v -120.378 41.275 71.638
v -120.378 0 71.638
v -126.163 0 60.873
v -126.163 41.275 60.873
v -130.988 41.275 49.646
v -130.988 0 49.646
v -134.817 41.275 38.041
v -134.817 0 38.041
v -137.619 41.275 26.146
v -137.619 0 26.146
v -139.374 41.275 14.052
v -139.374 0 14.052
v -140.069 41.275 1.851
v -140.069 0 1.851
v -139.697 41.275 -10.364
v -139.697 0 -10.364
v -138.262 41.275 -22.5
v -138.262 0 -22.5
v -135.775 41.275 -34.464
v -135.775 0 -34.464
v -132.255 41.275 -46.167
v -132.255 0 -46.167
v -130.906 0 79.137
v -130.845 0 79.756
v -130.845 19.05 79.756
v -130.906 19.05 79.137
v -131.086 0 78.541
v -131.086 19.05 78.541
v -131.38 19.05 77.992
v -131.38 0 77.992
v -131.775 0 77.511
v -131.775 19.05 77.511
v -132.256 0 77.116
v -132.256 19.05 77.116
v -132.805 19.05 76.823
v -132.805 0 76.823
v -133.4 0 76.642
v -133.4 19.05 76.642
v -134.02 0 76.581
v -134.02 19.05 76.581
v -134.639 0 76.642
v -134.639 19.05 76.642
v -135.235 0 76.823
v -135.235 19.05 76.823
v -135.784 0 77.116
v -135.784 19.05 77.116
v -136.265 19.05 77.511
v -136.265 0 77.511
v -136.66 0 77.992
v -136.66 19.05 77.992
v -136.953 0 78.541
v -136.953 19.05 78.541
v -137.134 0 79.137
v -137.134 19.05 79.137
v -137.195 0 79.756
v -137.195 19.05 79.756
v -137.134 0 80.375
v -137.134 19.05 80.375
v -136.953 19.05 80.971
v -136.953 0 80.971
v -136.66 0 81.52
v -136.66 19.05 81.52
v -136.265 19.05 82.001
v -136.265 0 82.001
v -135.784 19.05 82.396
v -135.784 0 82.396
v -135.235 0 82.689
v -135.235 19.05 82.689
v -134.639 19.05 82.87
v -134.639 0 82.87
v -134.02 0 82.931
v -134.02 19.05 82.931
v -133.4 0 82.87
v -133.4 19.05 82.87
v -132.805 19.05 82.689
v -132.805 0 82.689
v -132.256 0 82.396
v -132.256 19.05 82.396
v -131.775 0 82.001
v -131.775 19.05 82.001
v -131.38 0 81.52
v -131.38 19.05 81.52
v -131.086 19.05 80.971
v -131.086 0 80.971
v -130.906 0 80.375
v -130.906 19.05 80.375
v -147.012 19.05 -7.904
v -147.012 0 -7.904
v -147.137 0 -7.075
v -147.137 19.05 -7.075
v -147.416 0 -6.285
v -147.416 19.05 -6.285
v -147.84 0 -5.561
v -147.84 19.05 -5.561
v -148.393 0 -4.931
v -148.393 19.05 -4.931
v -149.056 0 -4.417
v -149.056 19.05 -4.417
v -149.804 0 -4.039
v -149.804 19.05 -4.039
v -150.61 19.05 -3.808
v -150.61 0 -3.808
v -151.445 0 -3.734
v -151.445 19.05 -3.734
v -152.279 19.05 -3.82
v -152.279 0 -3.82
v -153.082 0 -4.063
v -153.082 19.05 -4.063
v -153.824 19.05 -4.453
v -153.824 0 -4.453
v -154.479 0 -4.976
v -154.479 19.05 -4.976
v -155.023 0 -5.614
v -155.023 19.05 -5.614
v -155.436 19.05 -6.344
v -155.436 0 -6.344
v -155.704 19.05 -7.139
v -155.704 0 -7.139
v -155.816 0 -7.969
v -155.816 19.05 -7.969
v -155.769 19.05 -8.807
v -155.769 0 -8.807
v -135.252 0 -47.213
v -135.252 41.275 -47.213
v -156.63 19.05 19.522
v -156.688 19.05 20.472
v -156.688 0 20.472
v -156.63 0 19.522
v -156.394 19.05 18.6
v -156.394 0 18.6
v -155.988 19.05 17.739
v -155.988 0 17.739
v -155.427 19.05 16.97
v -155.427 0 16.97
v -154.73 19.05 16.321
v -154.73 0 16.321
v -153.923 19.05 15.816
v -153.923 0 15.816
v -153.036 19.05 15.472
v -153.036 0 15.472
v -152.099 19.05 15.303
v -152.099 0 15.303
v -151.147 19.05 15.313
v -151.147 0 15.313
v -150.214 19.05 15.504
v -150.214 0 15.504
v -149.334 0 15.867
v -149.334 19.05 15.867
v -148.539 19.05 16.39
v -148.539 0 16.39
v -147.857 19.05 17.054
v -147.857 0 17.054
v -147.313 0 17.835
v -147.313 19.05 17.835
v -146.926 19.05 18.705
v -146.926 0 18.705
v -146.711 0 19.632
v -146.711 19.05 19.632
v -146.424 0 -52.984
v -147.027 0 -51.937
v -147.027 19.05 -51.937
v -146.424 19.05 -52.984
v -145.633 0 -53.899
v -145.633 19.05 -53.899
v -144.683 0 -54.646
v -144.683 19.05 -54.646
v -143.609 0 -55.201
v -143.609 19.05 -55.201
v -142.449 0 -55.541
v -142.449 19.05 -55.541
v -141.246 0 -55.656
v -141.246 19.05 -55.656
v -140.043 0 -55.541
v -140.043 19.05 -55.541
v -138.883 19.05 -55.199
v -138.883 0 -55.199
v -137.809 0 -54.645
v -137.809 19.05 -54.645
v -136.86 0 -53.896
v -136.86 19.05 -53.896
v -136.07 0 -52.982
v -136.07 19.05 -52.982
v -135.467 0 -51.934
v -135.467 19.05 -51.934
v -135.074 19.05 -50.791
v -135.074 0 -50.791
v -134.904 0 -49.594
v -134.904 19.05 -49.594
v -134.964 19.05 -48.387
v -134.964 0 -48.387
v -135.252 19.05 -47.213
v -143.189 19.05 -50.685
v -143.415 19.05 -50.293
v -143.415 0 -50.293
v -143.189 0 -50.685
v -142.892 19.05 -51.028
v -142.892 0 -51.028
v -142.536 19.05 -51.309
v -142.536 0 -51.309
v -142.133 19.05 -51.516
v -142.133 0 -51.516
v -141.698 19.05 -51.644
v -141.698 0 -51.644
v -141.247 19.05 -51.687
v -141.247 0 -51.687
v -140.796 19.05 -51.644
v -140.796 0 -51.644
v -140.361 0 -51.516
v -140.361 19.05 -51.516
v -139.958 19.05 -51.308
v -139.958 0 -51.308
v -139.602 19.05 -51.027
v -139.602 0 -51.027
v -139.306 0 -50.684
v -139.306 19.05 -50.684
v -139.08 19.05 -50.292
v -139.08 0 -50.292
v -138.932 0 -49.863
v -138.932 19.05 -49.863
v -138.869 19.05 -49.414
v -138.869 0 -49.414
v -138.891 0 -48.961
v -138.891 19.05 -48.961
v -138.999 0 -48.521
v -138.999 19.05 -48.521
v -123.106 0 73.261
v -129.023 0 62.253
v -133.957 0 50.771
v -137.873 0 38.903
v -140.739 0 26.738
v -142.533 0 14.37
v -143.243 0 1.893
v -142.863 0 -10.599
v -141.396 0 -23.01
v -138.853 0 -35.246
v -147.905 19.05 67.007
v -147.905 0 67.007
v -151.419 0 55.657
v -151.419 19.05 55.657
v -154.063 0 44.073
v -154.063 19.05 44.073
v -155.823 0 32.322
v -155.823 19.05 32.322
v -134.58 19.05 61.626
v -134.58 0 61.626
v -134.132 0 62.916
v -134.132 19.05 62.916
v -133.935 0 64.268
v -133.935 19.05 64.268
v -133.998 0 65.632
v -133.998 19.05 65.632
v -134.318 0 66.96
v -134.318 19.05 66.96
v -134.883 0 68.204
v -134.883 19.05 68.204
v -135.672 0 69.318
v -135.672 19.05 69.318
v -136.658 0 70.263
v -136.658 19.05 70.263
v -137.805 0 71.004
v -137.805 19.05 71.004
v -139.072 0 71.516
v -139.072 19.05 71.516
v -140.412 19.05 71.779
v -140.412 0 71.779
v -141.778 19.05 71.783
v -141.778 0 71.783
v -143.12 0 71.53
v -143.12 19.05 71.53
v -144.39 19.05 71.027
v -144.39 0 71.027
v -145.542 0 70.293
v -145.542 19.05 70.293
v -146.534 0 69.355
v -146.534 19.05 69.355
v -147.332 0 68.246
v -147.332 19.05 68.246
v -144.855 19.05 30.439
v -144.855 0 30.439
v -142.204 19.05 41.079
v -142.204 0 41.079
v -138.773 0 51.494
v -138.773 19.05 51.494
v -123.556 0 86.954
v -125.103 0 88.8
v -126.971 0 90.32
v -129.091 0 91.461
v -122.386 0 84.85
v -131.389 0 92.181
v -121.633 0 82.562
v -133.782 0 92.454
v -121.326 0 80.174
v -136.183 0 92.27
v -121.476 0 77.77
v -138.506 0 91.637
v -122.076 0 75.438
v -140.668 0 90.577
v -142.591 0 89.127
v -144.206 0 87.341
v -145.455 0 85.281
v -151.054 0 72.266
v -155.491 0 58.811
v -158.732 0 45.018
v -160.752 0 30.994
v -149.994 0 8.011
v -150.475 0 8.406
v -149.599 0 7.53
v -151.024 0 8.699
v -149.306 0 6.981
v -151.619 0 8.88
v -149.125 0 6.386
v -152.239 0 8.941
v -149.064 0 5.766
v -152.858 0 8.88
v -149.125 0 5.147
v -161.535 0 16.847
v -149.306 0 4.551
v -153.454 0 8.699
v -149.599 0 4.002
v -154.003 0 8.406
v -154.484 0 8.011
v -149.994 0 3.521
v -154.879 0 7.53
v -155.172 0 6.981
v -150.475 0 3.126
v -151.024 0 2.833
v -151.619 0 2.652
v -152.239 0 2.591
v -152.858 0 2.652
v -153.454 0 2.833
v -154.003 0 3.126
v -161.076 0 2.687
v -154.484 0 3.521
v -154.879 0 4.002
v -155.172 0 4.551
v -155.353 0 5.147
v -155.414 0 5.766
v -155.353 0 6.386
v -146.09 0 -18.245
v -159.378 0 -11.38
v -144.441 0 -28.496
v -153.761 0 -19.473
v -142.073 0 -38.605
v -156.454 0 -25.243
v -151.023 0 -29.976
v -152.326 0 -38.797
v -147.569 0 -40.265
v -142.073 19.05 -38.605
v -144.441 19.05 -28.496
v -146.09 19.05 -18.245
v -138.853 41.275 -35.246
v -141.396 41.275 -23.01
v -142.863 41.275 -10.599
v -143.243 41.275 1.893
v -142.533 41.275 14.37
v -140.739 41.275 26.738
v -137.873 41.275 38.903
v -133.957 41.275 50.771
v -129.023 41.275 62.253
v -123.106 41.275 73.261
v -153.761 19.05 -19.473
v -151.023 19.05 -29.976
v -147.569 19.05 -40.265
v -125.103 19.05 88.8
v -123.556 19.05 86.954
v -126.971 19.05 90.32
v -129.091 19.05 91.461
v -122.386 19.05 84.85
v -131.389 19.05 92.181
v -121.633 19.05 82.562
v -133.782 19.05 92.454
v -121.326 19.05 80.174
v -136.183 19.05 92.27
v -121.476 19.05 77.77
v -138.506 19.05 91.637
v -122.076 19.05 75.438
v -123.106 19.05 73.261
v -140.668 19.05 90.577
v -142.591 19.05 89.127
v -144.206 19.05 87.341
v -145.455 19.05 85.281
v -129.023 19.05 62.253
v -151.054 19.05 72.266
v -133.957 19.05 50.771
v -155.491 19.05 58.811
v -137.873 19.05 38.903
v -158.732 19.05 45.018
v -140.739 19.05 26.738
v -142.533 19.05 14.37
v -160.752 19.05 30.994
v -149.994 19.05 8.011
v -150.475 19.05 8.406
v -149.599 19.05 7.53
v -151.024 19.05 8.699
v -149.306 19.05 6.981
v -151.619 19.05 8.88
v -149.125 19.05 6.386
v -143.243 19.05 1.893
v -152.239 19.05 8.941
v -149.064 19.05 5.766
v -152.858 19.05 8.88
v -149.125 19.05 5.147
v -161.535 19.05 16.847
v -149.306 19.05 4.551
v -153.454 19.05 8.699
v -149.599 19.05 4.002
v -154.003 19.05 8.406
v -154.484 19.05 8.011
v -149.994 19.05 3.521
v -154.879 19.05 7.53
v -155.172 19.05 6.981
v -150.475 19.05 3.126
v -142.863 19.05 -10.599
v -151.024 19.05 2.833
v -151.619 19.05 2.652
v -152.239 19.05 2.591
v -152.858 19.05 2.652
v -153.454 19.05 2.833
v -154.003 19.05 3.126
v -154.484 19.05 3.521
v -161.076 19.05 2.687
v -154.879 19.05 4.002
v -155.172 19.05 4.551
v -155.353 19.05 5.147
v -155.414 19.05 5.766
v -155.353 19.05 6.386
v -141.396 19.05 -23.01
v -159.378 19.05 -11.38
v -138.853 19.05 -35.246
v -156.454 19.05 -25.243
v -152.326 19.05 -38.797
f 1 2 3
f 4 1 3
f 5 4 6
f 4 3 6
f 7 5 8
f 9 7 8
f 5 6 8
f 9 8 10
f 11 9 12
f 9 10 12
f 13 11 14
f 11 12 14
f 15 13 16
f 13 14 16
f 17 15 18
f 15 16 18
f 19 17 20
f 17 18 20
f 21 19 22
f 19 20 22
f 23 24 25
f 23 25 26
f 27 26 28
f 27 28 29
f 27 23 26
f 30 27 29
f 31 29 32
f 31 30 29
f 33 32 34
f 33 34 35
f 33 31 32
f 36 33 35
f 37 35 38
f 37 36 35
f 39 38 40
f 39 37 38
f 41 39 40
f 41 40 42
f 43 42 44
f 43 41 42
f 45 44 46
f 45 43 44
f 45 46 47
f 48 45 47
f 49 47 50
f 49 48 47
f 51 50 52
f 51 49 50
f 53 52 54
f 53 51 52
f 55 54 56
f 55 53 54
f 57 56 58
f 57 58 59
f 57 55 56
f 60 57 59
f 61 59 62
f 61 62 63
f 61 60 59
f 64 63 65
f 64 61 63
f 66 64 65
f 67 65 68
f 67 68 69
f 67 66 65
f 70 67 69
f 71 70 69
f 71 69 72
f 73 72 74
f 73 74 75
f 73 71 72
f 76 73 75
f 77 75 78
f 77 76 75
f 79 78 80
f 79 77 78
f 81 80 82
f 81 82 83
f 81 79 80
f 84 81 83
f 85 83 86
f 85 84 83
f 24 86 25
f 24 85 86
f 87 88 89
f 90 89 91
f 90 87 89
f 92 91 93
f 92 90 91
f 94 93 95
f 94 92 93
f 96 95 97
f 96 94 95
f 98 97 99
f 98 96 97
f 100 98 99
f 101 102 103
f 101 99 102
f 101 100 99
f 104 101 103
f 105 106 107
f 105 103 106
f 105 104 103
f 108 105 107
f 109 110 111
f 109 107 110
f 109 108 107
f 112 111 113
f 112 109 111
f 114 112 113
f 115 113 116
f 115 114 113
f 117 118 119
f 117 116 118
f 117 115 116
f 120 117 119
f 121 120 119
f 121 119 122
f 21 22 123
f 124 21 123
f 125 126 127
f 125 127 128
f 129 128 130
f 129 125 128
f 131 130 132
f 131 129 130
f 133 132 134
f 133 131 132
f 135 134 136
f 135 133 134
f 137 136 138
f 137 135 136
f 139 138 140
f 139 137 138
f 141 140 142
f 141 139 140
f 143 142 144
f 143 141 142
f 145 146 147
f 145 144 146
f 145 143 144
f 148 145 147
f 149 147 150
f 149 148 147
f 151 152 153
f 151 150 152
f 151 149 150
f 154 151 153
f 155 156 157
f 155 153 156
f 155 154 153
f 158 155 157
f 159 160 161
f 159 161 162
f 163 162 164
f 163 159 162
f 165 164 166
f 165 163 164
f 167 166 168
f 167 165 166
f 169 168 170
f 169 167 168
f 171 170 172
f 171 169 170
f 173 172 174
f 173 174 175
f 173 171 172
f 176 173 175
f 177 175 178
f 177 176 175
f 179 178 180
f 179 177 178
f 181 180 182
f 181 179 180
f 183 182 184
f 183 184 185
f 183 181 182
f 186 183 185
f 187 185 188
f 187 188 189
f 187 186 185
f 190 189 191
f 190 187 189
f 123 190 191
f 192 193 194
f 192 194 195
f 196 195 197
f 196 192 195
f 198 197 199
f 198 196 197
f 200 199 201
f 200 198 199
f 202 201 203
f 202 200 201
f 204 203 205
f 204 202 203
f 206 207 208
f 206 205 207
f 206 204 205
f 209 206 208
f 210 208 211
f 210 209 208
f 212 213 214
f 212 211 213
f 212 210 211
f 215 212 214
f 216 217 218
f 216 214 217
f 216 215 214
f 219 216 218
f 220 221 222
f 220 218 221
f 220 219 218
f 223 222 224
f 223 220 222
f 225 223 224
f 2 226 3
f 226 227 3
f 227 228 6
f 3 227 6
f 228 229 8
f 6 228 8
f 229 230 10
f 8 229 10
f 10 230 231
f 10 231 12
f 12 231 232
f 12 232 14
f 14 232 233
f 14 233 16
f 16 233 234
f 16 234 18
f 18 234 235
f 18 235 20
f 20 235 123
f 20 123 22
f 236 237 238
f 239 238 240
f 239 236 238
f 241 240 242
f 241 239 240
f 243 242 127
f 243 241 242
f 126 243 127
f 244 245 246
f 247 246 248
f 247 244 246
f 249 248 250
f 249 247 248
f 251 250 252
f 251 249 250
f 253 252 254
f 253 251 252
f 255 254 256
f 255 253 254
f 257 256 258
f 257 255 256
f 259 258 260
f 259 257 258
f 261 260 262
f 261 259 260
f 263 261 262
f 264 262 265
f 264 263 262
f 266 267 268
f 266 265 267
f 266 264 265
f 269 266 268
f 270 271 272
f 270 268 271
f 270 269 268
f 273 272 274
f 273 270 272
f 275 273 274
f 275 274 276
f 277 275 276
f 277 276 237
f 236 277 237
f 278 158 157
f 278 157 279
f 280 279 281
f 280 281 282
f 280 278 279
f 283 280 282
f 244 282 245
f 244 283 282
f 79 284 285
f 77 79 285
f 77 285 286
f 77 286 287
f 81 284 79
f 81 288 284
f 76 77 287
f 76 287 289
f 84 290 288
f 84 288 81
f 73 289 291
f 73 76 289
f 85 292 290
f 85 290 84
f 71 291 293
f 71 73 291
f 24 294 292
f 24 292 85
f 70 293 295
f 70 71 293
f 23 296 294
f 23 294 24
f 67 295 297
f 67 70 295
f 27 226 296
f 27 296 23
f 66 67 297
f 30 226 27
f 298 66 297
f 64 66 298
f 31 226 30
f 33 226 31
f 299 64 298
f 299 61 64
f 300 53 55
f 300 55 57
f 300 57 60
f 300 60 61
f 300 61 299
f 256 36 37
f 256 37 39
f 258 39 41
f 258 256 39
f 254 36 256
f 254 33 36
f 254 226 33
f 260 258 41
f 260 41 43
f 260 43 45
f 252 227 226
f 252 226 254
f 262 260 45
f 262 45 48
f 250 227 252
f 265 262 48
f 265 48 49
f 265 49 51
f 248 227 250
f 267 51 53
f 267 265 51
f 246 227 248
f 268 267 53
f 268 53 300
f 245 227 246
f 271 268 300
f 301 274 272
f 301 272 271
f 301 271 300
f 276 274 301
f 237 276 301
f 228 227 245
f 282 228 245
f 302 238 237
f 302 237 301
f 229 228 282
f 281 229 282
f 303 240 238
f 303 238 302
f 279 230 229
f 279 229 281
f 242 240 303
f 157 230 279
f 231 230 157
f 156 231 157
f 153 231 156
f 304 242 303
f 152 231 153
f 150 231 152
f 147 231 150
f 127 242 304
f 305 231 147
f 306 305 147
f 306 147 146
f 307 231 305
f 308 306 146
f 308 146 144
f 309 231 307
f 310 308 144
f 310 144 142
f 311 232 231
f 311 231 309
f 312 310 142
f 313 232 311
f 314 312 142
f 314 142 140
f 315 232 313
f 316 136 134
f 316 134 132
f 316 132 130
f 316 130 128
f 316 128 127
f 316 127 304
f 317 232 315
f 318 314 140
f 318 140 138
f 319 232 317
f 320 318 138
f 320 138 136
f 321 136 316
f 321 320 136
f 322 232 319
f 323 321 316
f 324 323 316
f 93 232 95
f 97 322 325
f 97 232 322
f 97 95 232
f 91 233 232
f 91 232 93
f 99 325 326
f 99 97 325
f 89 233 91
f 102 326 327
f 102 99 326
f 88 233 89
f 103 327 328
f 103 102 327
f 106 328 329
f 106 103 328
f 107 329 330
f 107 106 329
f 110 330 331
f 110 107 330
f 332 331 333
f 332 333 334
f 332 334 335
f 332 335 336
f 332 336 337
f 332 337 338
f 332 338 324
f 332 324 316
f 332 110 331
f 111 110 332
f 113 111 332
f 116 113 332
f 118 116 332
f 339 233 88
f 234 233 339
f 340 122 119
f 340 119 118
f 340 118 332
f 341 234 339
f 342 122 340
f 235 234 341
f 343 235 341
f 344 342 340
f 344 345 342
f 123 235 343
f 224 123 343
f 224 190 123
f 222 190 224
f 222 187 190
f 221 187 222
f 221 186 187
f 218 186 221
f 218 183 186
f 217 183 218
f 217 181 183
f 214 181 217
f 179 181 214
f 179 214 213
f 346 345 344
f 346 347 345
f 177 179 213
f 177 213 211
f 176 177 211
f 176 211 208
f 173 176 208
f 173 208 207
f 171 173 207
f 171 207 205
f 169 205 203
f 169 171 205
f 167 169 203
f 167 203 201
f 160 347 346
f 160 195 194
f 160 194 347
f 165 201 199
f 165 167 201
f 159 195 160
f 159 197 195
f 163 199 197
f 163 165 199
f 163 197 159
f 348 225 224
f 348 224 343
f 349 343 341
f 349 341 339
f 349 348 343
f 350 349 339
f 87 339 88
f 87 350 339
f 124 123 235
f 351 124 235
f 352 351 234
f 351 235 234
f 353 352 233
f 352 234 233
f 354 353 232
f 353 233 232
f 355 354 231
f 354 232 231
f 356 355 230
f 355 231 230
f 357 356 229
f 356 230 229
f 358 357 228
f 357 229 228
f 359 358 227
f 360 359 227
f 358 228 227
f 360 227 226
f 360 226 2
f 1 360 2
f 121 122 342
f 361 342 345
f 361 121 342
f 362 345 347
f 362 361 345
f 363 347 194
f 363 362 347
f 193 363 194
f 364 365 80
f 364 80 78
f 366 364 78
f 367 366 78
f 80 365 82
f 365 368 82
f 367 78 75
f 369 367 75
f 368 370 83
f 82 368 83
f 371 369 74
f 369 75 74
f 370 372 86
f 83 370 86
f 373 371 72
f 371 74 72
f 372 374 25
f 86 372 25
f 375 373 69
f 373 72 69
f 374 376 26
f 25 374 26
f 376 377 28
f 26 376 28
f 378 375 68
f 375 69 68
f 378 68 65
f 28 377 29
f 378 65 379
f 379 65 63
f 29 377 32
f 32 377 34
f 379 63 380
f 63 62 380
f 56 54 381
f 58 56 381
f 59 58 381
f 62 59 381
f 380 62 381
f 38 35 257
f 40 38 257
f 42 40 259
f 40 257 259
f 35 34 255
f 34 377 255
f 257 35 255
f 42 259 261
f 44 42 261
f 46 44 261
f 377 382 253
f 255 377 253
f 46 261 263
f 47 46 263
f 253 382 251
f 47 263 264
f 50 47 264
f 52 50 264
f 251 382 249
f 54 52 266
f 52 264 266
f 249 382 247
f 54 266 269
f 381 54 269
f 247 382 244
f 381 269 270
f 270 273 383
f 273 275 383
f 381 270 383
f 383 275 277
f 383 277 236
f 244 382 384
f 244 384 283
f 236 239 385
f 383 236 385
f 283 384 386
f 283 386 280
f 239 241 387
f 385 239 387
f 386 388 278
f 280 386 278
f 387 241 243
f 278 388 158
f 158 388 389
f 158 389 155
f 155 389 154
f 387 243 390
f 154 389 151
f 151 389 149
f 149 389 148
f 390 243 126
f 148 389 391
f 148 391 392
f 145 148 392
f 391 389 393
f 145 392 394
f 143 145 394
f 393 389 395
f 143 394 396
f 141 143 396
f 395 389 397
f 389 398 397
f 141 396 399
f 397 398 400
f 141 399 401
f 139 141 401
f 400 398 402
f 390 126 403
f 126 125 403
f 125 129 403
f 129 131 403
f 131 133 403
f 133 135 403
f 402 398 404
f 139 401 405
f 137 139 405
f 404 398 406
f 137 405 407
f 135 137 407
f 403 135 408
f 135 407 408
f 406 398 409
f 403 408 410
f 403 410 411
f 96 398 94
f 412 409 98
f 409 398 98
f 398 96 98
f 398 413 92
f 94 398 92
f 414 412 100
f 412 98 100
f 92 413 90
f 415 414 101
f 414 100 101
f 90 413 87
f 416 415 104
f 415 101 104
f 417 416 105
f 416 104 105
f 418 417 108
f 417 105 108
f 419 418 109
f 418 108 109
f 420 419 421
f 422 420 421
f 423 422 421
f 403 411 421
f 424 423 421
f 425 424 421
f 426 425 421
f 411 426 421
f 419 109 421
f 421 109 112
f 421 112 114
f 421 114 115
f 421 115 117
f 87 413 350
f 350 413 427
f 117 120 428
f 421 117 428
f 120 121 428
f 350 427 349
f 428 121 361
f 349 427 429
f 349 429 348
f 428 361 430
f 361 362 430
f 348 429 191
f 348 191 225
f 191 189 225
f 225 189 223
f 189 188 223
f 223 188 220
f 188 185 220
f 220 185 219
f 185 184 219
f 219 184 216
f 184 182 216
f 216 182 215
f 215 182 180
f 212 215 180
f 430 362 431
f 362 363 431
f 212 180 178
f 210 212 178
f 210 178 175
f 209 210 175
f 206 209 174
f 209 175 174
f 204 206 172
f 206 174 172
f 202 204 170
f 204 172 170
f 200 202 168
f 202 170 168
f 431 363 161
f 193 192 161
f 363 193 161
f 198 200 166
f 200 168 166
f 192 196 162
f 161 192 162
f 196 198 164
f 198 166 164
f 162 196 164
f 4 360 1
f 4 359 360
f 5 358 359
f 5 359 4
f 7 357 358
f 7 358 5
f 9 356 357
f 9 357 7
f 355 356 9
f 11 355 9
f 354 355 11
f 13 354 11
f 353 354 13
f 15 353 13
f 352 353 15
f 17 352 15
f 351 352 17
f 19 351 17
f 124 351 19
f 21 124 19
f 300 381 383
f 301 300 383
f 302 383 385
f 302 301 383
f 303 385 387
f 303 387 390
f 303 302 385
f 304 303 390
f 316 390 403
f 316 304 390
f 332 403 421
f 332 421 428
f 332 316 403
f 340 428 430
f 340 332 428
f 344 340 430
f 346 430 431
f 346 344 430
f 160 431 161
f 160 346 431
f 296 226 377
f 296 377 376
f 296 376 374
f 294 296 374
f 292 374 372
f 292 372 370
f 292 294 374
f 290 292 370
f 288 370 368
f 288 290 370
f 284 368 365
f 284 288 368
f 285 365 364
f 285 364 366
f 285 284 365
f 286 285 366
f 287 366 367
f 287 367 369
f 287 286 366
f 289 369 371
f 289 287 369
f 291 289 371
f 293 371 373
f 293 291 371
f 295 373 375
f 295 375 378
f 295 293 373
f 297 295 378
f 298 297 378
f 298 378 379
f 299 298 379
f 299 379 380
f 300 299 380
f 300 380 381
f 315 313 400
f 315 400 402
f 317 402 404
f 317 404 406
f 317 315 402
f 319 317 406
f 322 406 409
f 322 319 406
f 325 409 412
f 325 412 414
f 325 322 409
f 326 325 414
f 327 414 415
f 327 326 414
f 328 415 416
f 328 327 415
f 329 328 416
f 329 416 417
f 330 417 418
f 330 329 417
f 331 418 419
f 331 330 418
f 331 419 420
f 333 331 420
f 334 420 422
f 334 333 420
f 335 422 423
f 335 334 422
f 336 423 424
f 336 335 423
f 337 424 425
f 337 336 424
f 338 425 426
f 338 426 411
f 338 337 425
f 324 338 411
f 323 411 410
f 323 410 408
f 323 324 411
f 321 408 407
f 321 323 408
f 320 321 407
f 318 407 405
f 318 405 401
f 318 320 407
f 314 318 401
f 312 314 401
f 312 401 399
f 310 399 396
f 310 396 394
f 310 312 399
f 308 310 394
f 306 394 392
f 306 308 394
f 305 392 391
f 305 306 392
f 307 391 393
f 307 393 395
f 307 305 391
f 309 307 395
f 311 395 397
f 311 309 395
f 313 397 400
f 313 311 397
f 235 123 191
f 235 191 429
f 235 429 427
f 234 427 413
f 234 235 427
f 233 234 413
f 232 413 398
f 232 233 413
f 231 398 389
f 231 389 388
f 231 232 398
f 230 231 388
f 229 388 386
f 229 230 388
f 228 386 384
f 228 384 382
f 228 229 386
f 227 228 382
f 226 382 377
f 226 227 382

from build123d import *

# Parameters (mm, degrees)
SKETCH1_R           = 3.175
BOSS_EXTRUDE1_DEPTH = 19.05
CUT_EXTRUDE1_DEPTH  = 20.05
CUT_EXTRUDE2_DEPTH  = 20.05
BOSS_EXTRUDE2_DEPTH = 41.275


with BuildPart() as part:
    # Sketch1 → Boss-Extrude1 (new body)
    with BuildSketch(Plane(origin=(0, 0, 0), x_dir=(1, 0, 0), z_dir=(0, 1, 0))):
        with BuildLine():
            ThreePointArc((-135.252327308, 47.213234308), (-142.533412468, -14.370381558), (-123.105955958, -73.261211726))
            ThreePointArc((-123.105955958, -73.261211726), (-128.003817931, -90.940825055), (-145.454595651, -85.28148443))
            ThreePointArc((-145.454595651, -85.28148443), (-161.535072193, -16.847470136), (-147.026852029, 51.937030923))
            ThreePointArc((-147.026852029, 51.937030923), (-138.883189966, 55.199429393), (-135.252327308, 47.213234308))
        make_face()
        with Locations((-134.019604536, -79.756)):
            Circle(SKETCH1_R, mode=Mode.SUBTRACT)
        with Locations((-152.238831544, -5.766137402)):
            Circle(SKETCH1_R, mode=Mode.SUBTRACT)
    extrude(amount=BOSS_EXTRUDE1_DEPTH)

    # Sketch2 → Cut-Extrude1 (cut, through all)
    with BuildSketch(Plane(origin=(0, 19.05, 0), x_dir=(1, 0, 0), z_dir=(0, 1, 0))):
        with BuildLine():
            ThreePointArc((-143.414791125, 50.292648794), (-140.360917851, 51.51604822), (-138.999344354, 48.521225064))
            ThreePointArc((-138.999344354, 48.521225064), (-144.440688949, 28.495866167), (-147.012407175, 7.904375319))
            ThreePointArc((-147.012407175, 7.904375319), (-151.864331626, 3.75755277), (-155.768721686, 8.806616683))
            ThreePointArc((-155.768721686, 8.806616683), (-151.023065455, 29.975855535), (-143.414791125, 50.292648794))
        make_face()
    extrude(amount=-CUT_EXTRUDE1_DEPTH, mode=Mode.SUBTRACT)

    # Sketch4 → Cut-Extrude2 (cut, through all)
    with BuildSketch(Plane(origin=(0, 19.05, 0), x_dir=(1, 0, 0), z_dir=(0, 1, 0))):
        with BuildLine():
            ThreePointArc((-146.71076139, -19.632341547), (-142.203918186, -41.079459526), (-134.579739329, -61.626050533))
            ThreePointArc((-134.579739329, -61.626050533), (-138.426335153, -71.290308551), (-147.905040723, -67.006814278))
            ThreePointArc((-147.905040723, -67.006814278), (-154.06338729, -44.072990018), (-156.68753097, -20.472155339))
            ThreePointArc((-156.68753097, -20.472155339), (-152.098946776, -15.302721276), (-146.71076139, -19.632341547))
        make_face()
    extrude(amount=-CUT_EXTRUDE2_DEPTH, mode=Mode.SUBTRACT)


with BuildPart() as body_2:
    # Sketch3 → Boss-Extrude2 (new body)
    with BuildSketch(Plane(origin=(0, 0, 0), x_dir=(1, 0, 0), z_dir=(0, 1, 0))):
        with BuildLine():
            Line((-123.105955958, -73.261211726), (-120.377543814, -71.637514658))
            ThreePointArc((-120.377543814, -71.637514658), (-139.374427263, -14.051889059), (-132.254713671, 46.166841704))
            Line((-132.254713671, 46.166841704), (-135.252327308, 47.213234308))
            ThreePointArc((-135.252327308, 47.213234308), (-142.533412468, -14.370381558), (-123.105955958, -73.261211726))
        make_face()
    extrude(amount=BOSS_EXTRUDE2_DEPTH)


solid = Compound([part.part, body_2.part])
